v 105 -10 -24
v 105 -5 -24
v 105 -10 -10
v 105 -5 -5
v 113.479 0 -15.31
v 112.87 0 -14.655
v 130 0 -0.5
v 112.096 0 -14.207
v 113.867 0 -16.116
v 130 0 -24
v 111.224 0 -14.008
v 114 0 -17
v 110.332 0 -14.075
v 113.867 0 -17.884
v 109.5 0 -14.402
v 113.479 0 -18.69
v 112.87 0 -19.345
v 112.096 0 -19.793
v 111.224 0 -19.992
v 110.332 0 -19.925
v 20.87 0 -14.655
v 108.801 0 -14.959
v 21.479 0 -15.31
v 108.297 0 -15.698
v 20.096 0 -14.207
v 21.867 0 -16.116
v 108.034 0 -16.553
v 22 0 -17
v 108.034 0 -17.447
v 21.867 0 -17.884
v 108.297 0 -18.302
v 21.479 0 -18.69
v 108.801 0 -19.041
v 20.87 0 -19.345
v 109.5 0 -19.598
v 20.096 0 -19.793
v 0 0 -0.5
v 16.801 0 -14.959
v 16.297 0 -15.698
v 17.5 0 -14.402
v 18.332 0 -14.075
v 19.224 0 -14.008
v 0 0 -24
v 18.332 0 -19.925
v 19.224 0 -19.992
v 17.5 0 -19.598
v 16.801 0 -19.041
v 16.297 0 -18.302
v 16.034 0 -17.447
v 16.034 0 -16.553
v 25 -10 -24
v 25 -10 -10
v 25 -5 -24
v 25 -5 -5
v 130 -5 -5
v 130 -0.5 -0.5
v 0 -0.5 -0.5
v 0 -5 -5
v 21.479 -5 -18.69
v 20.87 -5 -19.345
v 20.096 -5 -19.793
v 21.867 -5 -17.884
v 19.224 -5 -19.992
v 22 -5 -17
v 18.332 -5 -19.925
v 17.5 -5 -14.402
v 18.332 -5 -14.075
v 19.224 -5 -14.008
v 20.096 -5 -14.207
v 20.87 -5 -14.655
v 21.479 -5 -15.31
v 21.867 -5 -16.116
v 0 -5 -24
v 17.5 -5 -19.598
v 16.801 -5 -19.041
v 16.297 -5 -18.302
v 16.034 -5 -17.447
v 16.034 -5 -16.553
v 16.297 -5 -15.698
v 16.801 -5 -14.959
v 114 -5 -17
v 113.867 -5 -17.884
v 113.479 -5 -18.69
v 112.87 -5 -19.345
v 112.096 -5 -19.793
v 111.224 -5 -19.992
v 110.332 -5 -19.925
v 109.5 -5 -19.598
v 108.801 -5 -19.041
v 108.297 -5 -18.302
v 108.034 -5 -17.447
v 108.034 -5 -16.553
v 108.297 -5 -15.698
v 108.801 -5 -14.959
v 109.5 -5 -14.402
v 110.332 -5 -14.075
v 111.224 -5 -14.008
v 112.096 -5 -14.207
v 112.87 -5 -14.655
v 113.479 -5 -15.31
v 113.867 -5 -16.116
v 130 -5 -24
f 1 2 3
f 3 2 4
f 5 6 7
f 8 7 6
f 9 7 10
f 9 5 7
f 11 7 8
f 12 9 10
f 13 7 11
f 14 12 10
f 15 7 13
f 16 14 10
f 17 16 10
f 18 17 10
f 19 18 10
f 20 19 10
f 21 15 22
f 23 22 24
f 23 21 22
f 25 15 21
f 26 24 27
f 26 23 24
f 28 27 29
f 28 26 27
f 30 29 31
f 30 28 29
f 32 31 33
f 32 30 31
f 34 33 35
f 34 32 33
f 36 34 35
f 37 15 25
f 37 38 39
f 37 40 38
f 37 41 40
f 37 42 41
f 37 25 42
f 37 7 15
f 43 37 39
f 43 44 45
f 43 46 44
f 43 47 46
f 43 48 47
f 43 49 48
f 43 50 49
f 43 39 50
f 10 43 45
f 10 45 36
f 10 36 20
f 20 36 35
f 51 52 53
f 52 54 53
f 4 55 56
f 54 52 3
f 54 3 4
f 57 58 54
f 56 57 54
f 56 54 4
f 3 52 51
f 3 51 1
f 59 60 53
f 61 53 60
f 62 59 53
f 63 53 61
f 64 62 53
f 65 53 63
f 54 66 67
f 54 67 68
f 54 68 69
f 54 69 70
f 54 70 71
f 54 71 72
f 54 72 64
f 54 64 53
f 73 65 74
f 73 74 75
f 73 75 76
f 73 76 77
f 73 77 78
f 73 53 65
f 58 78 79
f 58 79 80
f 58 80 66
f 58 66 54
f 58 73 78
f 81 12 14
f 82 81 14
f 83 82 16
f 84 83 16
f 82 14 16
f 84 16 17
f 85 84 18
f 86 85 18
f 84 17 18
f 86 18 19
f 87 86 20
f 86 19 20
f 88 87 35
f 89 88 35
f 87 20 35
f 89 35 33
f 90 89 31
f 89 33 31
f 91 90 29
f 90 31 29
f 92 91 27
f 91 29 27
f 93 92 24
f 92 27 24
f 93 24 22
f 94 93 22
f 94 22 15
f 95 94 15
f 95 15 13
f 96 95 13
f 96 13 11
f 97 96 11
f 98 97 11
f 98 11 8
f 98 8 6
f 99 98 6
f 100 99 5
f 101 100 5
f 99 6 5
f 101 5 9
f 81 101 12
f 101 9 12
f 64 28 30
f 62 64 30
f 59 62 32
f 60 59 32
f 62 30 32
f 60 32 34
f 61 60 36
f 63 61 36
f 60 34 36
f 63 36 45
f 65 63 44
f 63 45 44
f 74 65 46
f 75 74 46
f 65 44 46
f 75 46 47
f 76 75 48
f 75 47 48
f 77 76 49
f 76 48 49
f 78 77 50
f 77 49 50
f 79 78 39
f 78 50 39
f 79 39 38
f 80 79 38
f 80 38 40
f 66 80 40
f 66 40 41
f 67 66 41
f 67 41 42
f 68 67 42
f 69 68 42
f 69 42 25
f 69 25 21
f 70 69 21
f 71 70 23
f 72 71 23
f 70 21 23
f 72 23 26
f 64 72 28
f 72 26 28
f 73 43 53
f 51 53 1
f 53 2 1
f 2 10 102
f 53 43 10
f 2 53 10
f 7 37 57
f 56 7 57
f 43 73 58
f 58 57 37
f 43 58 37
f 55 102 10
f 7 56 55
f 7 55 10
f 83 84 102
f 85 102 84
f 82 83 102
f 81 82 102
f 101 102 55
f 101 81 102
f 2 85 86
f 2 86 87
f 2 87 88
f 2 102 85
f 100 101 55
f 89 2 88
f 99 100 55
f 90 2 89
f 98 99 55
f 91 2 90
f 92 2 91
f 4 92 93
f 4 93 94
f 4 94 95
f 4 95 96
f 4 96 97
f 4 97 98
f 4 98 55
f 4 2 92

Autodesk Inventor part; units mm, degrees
ref_plane "YZ Plane" through (0, 0, 0) normal (1, 0, 0) x (0, 1, 0)
ref_plane "XZ Plane" through (0, 0, 0) normal (0, 1, 0) x (-1, 0, 0)
ref_plane "XY Plane" through (0, 0, 0) normal (0, 0, 1) x (1, 0, 0)
sketch "Sketch1" plane through (0, 0, 0) normal (1, 0, 0) x (0, 1, 0)
  line L0 (0, 0) -> (0, -36)
  line L1 (0, -36) -> (-5, -36)
  line L2 (-5, -36) -> (-5, -5)
  line L3 (-5, -5) -> (0, 0)
  dimension "d1" = 5
  dimension "d2" = 45
  dimension "d5" = 31
extrude "Extrusion1" add sketch "Sketch1" along normal blind 130
sketch "Sketch2" plane through (130, 0, 0) normal (1, 0, 0) x (0, 0, -1)
  line L0 (36, 0) -> (0, 0) projected
  line L1 (0, 0) -> (0.5, 0)
  line L2 (0.5, 0) -> (0.5, -0.5)
  line L3 (0, 0) -> (5, -5) projected
  line L4 (0, 0) -> (0.5, -0.5)
  dimension "d6" = 0.5
extrude "Extrusion2" cut sketch "Sketch2" against normal through all
sketch "Sketch3" plane through (0, 0, -36) normal (0, 1, 0) x (1, 0, 0)
  circle A0 centre (19, -6) radius 3
  circle A1 centre (19, -19) radius 3
  line L0 (0, -35.5) -> (0, 0) projected
  line L1 (0, 0) -> (130, 0) projected
  circle A2 centre (111, -6) radius 3
  circle A3 centre (111, -19) radius 3
  line L2 (130, 0) -> (130, -35.5) projected
  point P0 (0, -36)
  dimension "d9" = 6
  dimension "d10" = 6
  dimension "d11" = 19
  dimension "d12" = 13
  dimension "d13" = 6
  dimension "d16" = 6
  dimension "d17" = 6
  dimension "d18" = 19
  dimension "d19" = 13
extrude "Extrusion4" cut sketch "Sketch3" against normal up to next
sketch "Sketch4" plane through (0, -5, -36) normal (0, -1, 0) x (1, 0, 0)
  line L0 (0, 0) -> (130, 0) projected
  line L1 (0, 31) -> (130, 31) projected
  line L2 (25, 0) -> (105, 0)
  line L3 (105, 0) -> (105, 31)
  line L4 (105, 31) -> (25, 31)
  line L5 (25, 31) -> (25, 0)
  line L6 (130, 31) -> (130, 0) projected
  point P0 (0, 36)
  dimension "d22" = 25
  dimension "d23" = 25
extrude "Extrusion5" add sketch "Sketch4" along normal blind 5 contours L5 L1 L3 L0
sketch "Sketch5" plane through (25, -5, -36) normal (-1, 0, 0) x (0, 0, 1)
  line L0 (31, 0) -> (31, -5) projected
  line L1 (31, 0) -> (31, -5)
  line L2 (31, -5) -> (26, -5)
  line L3 (0, -5) -> (31, -5) projected
  line L4 (26, -5) -> (31, 0)
  point P0 (36, 5)
  dimension "d26" = 5
extrude "Extrusion6" cut sketch "Sketch5" against normal up to next
sketch "Sketch6" plane through (130, 0, 0) normal (1, 0, 0) x (0, 0, -1)
  line L0 (0.5, 0) -> (0.5, -0.5) projected
  line L1 (0.5, -0.5) -> (5, -5) projected
  line L2 (5, -5) -> (36, -5) projected
  line L3 (36, -5) -> (36, 0) projected
  line L4 (36, 0) -> (0.5, 0) projected
  line L5 (5, -5) -> (10, -10) projected
  line L6 (36, -10) -> (10, -10) projected
  line L7 (36, -5) -> (36, -10) projected
  line L8 (5, -5) -> (36, -5) projected
  line L9 (36, 0) -> (24, 0)
  line L10 (24, 0) -> (24, -5)
  line L11 (24, -5) -> (36, -5)
  line L12 (36, -5) -> (36, 0)
  point P0 (0, 0)
  dimension "d29" = 12
  dimension "d30" = 5
extrude "Extrusion7" cut sketch "Sketch6" against normal through all contours L4 L3 L2 L10
sketch "Sketch7" plane through (105, -10, -10) normal (1, 0, 0) x (0, 0, -1)
  line L0 (-5, 5) -> (0, 0) projected
  line L1 (26, 0) -> (0, 0) projected
  line L2 (26, 5) -> (26, 0) projected
  line L3 (14, 5) -> (26, 5) projected
  line L4 (-5, 5) -> (14, 5) projected
  line L5 (14, 5) -> (14, 10) projected
  line L6 (14, 10) -> (-9.5, 10) projected
  line L7 (-9.5, 10) -> (-9.5, 9.5) projected
  line L8 (-9.5, 9.5) -> (-5, 5) projected
  line L9 (-5, 5) -> (14, 5) projected
  line L10 (26, 0) -> (14, 0)
  line L11 (14, 0) -> (14, 5)
  line L12 (14, 5) -> (26, 5)
  line L13 (26, 5) -> (26, 0)
  point P0 (-10, 10)
extrude "Extrusion8" cut sketch "Sketch7" against normal through all contours L3 L2 L1 L11
properties part number "back_beam"
